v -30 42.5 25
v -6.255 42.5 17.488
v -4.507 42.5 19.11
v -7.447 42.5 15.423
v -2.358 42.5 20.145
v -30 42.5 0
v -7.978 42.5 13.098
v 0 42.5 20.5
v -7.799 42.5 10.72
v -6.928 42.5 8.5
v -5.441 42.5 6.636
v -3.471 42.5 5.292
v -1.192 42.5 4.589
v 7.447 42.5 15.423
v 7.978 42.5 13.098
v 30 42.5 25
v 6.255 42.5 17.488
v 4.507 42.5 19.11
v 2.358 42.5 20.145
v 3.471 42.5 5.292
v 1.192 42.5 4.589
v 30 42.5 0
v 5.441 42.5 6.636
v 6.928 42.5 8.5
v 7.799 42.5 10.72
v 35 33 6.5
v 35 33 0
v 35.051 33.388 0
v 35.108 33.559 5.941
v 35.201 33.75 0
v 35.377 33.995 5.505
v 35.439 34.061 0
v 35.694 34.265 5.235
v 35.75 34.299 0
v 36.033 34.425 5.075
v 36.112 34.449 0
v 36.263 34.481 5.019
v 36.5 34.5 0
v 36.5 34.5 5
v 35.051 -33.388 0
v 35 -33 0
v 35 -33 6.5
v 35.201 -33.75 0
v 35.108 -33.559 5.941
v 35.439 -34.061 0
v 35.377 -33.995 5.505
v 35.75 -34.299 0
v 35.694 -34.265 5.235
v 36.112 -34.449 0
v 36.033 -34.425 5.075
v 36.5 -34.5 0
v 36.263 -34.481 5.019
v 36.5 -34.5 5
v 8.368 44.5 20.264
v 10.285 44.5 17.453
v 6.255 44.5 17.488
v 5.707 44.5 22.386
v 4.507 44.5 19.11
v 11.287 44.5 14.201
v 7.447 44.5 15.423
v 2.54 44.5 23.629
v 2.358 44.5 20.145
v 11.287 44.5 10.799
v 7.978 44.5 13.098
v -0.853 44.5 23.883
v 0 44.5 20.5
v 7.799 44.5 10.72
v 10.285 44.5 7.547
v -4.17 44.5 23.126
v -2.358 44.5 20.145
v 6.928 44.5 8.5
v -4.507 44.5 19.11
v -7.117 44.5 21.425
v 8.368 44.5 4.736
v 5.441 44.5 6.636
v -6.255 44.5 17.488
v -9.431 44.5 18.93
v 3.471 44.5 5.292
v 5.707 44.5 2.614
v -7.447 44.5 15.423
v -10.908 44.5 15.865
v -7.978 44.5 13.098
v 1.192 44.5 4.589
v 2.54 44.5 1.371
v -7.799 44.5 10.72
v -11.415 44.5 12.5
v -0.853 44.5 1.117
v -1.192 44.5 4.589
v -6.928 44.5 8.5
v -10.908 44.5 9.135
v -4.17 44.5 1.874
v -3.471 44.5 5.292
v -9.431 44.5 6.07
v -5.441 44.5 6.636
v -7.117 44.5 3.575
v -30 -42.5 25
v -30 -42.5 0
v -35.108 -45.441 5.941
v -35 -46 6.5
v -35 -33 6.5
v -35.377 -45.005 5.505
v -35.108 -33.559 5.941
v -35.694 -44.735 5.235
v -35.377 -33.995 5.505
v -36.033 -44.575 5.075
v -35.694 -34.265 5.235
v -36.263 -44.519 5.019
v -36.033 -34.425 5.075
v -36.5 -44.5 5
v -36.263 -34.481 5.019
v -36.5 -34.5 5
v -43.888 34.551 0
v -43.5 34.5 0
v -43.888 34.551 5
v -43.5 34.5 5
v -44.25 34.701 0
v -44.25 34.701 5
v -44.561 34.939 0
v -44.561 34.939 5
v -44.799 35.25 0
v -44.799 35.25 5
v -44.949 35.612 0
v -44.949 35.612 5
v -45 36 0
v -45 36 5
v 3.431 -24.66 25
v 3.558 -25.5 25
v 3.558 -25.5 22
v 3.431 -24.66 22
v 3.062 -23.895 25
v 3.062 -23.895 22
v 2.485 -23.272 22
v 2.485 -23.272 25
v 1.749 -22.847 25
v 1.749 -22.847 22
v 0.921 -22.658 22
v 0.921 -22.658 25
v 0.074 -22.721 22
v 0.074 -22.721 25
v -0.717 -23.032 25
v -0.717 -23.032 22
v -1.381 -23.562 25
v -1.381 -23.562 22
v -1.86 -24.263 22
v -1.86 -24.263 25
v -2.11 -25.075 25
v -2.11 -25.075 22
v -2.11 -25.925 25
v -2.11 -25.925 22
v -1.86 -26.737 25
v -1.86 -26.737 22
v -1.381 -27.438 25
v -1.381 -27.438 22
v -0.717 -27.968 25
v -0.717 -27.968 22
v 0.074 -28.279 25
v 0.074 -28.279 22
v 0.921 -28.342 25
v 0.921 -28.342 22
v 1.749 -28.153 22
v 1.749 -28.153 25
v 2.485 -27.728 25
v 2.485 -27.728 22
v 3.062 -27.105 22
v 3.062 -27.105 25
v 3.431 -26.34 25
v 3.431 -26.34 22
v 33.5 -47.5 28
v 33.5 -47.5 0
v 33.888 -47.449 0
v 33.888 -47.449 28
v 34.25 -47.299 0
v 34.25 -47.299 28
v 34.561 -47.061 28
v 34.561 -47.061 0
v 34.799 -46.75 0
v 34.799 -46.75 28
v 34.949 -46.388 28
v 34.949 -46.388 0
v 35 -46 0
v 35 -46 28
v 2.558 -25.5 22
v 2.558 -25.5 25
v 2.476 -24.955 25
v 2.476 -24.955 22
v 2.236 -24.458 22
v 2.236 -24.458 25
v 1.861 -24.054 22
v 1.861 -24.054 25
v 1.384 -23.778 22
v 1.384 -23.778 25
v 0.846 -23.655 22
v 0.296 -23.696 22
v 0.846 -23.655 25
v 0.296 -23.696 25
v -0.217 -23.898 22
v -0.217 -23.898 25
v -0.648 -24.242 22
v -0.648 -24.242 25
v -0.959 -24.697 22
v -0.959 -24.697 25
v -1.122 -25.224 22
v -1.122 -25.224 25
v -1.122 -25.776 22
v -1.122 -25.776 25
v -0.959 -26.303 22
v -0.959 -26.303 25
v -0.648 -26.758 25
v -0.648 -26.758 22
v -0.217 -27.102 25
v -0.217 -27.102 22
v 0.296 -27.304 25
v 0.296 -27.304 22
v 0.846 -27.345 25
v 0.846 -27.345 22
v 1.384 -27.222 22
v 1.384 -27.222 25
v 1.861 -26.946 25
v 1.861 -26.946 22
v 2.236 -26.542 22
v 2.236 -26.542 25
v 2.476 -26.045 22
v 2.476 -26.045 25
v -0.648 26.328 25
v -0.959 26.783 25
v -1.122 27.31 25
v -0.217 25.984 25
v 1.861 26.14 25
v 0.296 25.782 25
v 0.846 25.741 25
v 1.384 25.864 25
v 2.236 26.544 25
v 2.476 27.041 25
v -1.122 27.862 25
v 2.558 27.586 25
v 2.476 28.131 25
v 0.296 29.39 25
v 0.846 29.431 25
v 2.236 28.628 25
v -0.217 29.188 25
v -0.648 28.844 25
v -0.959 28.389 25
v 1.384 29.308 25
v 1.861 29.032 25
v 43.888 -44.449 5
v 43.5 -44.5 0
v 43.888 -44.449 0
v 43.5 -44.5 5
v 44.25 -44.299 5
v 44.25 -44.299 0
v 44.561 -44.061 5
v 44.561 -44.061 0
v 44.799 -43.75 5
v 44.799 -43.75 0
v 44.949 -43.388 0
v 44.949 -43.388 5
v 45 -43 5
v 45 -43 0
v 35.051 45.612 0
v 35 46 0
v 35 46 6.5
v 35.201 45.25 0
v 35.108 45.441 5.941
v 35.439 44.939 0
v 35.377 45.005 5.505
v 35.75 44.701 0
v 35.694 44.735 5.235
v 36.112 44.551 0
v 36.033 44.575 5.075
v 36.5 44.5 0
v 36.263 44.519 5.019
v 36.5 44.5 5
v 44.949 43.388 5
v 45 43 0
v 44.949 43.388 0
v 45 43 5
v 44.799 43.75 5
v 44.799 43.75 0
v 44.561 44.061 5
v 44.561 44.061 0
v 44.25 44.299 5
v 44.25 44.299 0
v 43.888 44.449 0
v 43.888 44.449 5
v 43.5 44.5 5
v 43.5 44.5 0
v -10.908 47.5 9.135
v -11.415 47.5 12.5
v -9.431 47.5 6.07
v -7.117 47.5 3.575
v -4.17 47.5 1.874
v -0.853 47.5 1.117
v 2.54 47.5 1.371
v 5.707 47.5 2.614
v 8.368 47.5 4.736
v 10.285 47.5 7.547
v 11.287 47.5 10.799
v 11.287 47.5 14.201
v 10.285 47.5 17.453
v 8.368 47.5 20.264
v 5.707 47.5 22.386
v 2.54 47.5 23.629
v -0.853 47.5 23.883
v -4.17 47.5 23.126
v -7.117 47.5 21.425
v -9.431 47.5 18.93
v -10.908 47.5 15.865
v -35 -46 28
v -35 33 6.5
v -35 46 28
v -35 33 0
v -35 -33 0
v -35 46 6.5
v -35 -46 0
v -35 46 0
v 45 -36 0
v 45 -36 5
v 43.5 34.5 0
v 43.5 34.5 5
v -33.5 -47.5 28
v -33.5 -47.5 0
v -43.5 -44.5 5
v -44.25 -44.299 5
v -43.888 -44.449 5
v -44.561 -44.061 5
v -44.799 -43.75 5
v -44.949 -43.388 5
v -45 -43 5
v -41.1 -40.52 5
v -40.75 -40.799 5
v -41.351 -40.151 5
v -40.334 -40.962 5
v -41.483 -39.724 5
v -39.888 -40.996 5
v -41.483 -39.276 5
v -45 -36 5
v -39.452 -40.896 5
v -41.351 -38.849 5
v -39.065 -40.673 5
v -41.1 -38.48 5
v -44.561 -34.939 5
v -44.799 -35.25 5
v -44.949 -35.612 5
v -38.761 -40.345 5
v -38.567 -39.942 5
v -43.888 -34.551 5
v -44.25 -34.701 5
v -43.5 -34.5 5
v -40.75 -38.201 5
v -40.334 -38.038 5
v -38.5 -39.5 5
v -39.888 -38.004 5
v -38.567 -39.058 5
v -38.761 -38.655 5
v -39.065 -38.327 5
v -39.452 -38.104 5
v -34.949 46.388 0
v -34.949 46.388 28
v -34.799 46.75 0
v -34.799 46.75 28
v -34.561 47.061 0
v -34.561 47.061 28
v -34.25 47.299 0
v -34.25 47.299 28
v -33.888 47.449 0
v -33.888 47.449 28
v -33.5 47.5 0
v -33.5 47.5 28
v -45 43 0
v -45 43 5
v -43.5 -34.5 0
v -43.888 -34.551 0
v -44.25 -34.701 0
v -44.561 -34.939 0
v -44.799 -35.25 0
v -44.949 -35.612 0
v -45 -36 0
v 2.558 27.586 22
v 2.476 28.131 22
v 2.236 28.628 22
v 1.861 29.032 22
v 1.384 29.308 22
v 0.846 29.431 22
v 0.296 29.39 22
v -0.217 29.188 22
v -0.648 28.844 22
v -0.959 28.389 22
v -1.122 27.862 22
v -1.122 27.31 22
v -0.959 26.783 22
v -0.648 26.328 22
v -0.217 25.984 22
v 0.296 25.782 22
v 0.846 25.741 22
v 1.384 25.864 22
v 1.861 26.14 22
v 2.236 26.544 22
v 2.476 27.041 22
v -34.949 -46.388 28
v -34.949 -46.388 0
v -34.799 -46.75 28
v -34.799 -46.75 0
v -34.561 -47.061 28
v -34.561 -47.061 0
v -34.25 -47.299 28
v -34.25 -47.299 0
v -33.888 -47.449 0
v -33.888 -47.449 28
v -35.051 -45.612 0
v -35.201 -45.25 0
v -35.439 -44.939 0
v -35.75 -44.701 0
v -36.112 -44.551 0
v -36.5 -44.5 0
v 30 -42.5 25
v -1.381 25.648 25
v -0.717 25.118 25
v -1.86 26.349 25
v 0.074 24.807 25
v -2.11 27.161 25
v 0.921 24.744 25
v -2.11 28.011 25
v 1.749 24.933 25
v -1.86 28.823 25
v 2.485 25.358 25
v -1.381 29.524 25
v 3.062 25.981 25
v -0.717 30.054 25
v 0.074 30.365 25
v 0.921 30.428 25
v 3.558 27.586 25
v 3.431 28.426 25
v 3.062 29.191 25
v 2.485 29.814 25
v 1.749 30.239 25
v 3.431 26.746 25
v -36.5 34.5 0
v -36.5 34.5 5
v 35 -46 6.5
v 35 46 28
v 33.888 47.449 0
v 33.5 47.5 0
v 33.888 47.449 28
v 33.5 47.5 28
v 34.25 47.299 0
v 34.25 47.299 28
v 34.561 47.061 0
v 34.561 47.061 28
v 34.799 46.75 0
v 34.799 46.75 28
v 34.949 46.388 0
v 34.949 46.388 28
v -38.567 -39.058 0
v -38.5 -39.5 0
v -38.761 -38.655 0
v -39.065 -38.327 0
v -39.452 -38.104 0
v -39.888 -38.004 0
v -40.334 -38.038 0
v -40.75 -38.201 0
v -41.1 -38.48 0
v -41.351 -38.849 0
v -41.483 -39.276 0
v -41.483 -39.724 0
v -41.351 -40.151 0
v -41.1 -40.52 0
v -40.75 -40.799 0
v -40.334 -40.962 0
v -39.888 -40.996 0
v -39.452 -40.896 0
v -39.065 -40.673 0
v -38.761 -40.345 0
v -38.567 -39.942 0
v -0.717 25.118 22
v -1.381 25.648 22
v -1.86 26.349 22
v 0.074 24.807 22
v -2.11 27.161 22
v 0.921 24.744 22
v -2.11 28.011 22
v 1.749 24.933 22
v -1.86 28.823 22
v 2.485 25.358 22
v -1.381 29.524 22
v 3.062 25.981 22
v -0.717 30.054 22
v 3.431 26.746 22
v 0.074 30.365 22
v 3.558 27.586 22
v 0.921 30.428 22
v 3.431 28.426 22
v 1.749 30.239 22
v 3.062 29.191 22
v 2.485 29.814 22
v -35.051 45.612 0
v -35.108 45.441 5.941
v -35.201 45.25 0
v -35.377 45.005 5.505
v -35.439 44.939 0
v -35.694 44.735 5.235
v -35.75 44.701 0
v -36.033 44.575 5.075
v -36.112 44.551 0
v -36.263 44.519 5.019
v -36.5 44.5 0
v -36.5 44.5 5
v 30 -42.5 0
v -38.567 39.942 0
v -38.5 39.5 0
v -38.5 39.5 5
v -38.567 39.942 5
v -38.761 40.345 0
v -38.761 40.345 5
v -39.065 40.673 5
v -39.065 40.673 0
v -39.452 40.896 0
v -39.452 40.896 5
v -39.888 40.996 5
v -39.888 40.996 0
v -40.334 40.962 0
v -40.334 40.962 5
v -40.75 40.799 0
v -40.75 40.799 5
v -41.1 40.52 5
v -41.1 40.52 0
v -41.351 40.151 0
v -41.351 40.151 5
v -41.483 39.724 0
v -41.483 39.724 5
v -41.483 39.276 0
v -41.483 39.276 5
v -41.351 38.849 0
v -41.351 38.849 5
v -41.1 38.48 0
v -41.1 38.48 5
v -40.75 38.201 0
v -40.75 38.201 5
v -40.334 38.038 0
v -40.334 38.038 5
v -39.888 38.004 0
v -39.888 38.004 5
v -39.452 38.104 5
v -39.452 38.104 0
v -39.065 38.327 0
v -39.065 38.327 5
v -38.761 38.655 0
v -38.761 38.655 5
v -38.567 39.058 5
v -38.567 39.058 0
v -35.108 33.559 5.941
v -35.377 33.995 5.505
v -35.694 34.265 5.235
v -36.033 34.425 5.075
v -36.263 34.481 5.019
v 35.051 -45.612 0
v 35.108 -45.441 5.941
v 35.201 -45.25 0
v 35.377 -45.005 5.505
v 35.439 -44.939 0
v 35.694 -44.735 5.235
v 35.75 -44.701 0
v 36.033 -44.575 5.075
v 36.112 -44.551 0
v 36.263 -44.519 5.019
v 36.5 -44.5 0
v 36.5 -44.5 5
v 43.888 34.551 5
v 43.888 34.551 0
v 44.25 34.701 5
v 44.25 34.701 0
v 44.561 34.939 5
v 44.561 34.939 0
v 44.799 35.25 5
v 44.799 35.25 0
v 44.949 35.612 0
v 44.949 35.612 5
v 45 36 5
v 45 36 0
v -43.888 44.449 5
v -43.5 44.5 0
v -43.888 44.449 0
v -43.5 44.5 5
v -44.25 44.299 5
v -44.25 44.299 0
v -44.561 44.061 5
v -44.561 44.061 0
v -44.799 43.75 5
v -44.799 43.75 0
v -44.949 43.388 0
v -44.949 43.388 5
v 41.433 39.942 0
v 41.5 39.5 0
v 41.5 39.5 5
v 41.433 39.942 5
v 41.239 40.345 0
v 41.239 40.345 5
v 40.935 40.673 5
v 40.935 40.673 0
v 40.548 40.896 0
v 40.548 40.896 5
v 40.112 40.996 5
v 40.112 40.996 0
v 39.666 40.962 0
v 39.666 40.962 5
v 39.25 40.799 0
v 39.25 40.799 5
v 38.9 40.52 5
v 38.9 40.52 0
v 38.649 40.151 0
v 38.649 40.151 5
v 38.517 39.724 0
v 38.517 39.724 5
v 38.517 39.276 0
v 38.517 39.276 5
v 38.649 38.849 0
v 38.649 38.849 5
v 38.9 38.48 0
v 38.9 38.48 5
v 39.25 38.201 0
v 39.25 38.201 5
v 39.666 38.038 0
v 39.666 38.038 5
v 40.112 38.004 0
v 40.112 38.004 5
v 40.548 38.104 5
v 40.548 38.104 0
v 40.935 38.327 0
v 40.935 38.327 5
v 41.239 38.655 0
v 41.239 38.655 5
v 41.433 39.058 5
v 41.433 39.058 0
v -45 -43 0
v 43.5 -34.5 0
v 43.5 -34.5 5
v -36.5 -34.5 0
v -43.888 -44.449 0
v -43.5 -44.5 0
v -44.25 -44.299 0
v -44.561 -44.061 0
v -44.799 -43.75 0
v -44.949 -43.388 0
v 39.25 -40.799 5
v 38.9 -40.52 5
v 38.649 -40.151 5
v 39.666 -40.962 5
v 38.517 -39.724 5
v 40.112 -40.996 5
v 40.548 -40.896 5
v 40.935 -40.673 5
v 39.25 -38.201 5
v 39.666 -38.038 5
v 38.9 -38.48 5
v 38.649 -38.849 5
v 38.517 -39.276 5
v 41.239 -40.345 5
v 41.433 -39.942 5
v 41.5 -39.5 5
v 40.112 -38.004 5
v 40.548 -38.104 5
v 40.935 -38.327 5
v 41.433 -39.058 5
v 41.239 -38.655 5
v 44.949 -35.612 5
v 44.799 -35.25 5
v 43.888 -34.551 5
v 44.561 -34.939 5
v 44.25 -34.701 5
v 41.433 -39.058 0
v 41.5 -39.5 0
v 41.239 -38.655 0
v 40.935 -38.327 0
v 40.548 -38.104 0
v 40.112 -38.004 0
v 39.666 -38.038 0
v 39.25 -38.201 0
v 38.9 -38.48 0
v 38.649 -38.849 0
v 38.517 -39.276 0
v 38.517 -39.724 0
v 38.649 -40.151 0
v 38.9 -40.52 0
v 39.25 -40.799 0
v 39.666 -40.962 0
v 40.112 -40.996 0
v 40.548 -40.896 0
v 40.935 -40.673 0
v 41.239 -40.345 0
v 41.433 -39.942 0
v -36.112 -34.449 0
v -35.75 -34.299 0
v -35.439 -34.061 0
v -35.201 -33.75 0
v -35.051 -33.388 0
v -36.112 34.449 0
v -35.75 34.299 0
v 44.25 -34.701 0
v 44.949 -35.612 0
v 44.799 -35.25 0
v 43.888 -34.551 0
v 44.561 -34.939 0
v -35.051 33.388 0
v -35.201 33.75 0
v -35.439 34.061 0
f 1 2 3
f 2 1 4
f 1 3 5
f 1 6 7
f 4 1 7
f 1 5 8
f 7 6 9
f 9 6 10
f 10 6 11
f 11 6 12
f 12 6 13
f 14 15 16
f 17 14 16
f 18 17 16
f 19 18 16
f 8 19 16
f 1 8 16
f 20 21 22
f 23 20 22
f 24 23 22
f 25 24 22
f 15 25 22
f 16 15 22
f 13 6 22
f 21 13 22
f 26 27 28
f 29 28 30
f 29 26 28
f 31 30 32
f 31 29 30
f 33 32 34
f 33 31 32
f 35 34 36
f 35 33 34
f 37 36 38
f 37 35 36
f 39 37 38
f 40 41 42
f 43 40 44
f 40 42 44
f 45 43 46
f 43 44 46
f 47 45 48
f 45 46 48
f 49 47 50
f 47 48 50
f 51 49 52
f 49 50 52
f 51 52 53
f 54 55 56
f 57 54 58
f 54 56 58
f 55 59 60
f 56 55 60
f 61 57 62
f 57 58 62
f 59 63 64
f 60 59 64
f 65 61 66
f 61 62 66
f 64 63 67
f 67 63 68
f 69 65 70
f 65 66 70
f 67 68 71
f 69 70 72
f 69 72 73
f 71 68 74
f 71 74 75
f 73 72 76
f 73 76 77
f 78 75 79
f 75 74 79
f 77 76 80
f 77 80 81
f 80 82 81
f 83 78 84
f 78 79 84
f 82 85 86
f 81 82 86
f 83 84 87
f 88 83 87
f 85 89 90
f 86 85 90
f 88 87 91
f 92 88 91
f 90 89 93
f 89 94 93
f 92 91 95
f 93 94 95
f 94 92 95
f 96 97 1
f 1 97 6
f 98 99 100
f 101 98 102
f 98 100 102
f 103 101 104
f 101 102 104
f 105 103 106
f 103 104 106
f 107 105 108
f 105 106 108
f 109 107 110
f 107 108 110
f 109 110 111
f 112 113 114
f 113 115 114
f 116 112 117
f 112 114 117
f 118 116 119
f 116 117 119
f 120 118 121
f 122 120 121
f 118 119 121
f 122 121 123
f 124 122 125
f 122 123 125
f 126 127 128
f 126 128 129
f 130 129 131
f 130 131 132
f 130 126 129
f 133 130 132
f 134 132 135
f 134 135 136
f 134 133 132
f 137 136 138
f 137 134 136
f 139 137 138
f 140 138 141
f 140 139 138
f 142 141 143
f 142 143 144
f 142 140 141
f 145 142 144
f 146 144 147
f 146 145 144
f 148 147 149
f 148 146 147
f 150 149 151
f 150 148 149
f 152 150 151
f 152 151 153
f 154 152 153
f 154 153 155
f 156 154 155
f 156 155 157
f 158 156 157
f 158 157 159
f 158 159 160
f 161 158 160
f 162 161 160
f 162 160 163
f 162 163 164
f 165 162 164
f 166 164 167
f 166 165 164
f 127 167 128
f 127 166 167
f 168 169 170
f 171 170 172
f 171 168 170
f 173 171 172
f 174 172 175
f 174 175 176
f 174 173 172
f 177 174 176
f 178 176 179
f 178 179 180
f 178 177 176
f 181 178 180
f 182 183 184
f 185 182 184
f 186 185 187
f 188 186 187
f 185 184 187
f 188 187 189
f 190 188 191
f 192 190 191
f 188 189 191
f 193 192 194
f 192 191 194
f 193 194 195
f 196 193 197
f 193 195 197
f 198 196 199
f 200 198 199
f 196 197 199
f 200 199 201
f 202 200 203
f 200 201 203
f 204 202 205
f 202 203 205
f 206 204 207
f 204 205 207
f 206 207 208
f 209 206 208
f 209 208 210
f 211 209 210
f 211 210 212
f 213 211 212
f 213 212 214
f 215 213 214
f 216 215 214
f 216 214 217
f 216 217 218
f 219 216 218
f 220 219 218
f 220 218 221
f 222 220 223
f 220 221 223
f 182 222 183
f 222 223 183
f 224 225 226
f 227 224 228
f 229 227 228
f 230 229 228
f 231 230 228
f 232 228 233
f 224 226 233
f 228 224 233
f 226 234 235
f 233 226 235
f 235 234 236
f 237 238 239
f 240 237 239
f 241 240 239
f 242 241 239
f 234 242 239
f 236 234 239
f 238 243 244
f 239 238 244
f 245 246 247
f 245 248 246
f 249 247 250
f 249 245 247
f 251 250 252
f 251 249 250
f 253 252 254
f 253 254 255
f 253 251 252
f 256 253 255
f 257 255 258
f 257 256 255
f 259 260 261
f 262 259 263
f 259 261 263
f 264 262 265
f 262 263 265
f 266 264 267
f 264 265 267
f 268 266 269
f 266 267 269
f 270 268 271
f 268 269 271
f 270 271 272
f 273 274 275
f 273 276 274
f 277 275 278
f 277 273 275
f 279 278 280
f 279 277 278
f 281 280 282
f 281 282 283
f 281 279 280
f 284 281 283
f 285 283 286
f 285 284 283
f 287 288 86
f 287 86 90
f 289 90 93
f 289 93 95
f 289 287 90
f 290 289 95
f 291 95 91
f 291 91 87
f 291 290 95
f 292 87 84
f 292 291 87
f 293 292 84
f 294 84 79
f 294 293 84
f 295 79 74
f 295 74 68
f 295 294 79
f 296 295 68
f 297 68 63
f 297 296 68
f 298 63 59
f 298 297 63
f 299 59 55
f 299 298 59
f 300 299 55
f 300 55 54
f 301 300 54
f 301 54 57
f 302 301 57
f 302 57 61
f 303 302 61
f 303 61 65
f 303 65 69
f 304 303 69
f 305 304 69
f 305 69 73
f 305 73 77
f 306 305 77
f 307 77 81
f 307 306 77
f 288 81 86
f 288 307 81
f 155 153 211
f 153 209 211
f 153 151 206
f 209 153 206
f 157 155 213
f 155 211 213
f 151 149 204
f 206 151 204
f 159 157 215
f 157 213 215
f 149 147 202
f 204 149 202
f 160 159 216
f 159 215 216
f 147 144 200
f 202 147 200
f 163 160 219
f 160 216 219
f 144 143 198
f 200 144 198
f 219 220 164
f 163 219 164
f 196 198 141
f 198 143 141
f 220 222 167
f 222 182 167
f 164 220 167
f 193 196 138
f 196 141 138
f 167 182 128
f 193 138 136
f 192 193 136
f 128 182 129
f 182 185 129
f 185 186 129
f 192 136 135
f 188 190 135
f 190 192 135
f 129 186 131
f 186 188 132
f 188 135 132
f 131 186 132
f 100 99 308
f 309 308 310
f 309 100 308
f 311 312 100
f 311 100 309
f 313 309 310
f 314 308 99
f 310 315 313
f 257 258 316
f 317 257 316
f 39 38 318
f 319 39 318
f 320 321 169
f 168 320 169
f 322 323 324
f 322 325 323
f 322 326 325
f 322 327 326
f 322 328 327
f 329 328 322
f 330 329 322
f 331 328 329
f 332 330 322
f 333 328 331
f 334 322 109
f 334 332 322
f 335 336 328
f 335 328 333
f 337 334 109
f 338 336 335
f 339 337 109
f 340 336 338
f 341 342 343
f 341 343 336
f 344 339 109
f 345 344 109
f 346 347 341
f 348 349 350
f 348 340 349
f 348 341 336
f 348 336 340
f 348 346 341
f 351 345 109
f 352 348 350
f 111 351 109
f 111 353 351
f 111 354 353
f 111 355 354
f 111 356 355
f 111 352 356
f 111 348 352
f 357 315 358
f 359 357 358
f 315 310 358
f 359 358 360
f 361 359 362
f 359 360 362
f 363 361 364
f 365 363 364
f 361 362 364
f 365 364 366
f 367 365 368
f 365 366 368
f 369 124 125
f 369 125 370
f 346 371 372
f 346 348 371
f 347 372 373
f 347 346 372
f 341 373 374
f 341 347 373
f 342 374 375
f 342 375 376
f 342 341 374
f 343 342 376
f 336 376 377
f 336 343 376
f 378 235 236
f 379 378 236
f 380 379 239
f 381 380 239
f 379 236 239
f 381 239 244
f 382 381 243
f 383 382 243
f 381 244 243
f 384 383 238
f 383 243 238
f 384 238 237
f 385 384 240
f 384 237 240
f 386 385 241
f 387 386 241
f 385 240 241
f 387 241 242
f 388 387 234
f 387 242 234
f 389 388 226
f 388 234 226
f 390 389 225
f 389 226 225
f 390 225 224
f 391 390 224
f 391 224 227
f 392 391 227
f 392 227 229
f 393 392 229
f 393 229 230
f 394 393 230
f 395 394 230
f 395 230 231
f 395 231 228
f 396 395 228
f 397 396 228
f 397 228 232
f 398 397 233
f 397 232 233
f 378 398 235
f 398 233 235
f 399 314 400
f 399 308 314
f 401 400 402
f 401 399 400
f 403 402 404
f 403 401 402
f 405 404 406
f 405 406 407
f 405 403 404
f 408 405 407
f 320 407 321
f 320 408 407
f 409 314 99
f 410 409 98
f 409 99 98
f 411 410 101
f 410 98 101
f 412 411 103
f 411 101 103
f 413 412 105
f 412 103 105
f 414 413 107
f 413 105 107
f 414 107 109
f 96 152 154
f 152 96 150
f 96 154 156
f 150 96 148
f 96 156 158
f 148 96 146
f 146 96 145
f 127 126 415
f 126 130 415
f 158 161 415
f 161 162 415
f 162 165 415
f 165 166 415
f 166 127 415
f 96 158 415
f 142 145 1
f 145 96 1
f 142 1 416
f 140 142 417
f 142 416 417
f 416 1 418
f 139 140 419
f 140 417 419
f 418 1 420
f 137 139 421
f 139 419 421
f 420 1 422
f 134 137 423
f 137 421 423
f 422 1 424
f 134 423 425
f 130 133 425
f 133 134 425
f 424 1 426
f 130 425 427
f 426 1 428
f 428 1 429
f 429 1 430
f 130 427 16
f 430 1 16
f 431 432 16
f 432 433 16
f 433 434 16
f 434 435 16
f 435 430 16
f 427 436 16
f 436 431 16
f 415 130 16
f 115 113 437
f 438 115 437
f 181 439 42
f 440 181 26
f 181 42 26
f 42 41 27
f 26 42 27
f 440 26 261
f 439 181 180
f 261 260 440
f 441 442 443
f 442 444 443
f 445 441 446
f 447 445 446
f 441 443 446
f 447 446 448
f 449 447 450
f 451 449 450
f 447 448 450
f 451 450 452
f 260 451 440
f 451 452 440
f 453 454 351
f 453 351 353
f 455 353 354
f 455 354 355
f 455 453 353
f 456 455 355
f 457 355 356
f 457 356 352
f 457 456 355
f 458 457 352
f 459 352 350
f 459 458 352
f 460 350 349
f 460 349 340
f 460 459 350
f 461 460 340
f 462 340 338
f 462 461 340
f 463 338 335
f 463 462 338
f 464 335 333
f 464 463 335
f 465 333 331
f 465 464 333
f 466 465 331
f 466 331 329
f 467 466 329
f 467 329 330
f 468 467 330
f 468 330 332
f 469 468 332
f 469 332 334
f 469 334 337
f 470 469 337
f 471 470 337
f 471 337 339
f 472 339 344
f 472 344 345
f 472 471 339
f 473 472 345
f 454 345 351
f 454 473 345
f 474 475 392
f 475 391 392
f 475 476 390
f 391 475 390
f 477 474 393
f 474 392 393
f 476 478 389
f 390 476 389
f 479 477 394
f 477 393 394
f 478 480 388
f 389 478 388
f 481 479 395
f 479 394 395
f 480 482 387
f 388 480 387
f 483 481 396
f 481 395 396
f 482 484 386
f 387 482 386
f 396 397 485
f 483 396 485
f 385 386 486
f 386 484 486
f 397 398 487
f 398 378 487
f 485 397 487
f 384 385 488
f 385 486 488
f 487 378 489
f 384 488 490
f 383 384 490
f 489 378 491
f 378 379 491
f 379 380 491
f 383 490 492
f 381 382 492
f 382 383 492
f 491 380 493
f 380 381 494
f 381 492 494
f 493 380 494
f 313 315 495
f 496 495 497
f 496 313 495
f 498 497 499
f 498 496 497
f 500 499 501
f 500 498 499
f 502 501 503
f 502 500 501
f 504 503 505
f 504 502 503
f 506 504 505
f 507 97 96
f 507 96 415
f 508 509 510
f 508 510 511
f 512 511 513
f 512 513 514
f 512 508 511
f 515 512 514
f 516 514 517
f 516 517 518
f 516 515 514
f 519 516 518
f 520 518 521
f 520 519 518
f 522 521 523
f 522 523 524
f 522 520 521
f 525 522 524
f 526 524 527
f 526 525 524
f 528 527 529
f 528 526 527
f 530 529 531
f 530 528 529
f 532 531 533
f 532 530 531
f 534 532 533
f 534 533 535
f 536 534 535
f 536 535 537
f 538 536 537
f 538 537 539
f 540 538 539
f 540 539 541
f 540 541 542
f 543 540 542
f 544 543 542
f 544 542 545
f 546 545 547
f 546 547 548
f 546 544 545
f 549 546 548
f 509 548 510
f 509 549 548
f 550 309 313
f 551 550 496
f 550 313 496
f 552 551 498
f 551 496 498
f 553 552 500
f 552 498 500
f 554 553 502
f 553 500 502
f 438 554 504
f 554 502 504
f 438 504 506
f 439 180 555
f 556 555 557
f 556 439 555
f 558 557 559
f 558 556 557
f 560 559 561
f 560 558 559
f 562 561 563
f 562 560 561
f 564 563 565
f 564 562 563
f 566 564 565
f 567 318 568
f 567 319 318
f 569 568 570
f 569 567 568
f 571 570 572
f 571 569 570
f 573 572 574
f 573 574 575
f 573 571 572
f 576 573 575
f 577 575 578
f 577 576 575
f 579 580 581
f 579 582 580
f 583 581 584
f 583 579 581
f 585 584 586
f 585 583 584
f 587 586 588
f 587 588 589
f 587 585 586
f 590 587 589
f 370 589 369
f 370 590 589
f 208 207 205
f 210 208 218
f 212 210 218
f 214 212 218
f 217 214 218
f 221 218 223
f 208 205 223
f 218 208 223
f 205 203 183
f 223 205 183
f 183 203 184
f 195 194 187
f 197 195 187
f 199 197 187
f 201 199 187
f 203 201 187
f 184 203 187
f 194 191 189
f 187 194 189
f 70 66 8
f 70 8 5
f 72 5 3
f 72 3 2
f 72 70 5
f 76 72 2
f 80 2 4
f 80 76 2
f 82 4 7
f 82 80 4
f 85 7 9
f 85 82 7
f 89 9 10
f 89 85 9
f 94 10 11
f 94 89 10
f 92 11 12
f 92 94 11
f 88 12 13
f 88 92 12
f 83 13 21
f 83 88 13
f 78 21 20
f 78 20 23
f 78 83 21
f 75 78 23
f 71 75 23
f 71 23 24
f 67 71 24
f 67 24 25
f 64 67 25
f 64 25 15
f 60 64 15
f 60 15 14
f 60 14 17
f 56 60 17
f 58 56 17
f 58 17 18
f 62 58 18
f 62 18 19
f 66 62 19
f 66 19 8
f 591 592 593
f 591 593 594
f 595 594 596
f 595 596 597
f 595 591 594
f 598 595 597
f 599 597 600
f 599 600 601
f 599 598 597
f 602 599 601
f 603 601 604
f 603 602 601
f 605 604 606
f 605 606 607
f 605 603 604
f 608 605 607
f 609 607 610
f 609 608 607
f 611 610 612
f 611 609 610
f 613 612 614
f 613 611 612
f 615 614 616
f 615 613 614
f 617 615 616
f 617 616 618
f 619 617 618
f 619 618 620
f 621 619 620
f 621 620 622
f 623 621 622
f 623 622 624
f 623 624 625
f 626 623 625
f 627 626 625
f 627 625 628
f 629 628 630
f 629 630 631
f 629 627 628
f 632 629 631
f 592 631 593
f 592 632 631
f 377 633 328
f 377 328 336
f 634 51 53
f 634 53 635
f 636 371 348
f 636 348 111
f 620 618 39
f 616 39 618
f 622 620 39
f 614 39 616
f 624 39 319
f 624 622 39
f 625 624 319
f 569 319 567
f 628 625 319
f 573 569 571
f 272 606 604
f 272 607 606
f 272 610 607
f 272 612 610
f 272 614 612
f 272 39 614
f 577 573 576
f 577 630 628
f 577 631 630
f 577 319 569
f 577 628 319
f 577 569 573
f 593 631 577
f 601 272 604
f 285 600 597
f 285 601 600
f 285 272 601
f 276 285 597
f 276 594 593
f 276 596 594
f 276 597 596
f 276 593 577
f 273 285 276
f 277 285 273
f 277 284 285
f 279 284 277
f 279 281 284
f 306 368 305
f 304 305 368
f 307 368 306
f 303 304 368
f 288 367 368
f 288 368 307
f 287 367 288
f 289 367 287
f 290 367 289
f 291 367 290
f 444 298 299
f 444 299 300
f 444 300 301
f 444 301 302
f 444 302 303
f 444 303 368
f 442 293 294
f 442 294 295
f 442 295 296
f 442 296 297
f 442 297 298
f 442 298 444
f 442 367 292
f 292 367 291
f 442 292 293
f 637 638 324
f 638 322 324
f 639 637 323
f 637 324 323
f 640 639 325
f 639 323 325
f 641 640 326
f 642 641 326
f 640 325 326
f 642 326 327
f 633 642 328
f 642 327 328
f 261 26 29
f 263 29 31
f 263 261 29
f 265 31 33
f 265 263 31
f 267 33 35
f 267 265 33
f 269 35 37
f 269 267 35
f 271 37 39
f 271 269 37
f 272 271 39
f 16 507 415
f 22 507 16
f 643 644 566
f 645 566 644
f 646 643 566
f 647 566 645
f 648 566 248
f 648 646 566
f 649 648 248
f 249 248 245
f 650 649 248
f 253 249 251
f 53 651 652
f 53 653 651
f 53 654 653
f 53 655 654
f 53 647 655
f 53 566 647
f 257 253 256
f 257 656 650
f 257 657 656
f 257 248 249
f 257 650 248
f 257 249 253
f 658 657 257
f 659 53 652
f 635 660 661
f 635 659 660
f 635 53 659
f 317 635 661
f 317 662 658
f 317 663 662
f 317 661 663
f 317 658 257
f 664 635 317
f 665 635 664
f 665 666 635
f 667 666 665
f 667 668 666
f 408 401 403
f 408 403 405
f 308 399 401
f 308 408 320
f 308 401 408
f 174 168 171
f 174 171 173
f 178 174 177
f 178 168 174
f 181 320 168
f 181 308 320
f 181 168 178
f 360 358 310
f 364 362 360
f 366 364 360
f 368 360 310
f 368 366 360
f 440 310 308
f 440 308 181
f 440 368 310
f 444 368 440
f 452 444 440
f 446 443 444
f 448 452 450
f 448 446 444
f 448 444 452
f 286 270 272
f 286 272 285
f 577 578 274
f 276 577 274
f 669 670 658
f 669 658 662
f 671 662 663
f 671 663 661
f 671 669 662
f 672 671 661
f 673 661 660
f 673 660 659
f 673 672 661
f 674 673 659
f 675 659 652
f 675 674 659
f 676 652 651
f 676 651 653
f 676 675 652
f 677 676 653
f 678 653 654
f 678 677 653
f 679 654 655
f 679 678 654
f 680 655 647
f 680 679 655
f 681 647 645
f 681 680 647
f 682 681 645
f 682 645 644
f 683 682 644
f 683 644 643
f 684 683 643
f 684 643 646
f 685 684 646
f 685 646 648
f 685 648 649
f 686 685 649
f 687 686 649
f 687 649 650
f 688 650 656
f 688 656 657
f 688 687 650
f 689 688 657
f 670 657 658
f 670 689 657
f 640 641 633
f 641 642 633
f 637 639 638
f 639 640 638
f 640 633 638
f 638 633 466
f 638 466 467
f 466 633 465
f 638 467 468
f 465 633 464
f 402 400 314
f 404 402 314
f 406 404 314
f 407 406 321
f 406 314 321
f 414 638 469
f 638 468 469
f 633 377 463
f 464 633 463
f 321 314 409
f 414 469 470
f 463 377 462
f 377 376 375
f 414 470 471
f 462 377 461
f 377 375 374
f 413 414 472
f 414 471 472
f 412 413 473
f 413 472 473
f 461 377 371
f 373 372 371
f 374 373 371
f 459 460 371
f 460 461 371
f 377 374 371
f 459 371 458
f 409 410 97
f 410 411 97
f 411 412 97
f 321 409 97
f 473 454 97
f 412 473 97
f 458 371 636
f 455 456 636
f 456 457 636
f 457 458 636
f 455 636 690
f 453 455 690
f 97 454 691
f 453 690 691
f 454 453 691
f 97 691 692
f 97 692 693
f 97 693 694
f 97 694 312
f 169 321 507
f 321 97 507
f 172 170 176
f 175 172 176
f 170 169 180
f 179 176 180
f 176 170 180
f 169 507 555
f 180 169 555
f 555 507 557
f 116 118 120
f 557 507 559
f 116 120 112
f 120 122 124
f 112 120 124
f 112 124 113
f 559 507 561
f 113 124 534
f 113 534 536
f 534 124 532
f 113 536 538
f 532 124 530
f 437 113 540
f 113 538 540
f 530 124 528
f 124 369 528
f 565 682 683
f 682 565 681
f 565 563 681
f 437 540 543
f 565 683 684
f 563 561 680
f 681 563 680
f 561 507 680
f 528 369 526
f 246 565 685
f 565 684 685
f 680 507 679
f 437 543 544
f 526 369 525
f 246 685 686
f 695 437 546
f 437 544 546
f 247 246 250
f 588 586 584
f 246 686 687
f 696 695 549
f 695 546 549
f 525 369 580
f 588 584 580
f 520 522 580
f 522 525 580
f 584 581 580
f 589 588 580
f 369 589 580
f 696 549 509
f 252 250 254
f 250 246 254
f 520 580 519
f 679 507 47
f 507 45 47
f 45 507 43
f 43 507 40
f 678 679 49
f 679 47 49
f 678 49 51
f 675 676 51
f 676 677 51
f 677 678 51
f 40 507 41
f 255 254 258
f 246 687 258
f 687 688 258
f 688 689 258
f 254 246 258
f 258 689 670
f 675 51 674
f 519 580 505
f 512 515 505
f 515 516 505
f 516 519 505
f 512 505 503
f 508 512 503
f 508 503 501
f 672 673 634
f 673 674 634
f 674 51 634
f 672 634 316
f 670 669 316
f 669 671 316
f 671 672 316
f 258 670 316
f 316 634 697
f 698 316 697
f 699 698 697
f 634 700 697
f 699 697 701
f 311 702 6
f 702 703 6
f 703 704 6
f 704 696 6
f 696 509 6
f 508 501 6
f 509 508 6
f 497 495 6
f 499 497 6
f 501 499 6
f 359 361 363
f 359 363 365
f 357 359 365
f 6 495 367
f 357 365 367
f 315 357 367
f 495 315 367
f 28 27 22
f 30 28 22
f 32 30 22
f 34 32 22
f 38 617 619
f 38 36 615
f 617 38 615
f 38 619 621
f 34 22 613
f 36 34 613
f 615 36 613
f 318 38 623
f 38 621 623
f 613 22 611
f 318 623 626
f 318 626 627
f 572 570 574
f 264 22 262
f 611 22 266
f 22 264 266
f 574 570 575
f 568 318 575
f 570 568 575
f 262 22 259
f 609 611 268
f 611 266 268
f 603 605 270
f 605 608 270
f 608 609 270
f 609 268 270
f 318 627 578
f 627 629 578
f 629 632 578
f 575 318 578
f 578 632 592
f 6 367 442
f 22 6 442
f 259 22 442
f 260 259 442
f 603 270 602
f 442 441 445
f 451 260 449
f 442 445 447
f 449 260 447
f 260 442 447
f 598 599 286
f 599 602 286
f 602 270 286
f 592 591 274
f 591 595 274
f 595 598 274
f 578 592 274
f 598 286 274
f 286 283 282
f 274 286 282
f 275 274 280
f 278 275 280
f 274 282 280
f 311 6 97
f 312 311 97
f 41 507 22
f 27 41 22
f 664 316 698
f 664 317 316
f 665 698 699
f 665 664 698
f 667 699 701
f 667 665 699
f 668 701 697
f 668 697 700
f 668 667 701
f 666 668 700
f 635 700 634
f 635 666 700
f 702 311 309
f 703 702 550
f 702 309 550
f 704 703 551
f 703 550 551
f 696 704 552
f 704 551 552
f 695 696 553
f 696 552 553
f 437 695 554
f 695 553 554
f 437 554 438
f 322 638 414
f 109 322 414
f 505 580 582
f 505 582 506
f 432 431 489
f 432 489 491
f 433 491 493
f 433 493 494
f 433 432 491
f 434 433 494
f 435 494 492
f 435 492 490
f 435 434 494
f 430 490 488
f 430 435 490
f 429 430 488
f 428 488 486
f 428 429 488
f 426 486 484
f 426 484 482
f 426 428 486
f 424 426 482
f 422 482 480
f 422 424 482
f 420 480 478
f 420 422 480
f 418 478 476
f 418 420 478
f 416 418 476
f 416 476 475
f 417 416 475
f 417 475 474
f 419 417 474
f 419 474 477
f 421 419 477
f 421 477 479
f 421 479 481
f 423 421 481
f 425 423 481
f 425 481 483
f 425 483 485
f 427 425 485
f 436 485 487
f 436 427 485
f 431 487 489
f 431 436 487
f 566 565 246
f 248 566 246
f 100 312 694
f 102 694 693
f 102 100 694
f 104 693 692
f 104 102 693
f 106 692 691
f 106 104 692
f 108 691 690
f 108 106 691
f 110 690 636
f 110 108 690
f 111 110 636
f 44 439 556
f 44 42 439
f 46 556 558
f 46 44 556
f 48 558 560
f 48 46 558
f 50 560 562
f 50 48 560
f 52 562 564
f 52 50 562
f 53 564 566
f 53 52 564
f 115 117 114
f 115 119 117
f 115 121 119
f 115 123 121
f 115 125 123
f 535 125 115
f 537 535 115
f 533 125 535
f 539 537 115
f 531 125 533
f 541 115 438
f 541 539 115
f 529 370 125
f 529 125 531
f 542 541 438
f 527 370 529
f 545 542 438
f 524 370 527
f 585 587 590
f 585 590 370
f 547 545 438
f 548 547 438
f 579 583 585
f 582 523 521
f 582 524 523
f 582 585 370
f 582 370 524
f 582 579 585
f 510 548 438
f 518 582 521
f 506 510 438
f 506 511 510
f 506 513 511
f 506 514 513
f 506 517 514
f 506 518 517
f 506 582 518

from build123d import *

# Parameters (mm, degrees)
SKETCH1_W            = 70
SKETCH1_H            = 95
BASE_DEPTH           = 28
SKETCH1_7_W          = 10
SKETCH1_7_H          = 10
SKETCH1_7_R          = 1.5
MOUNTING_HOLES_DEPTH = 5
SKETCH1_6_W          = 60
SKETCH1_6_H          = 85
SKETCH1_6_R          = 2.85
SKETCH1_6_R_2        = 1.85
CAVITY_DEPTH         = 25
STANDOFF_START       = 25
SKETCH1_9_R          = 2.85
SKETCH1_9_R_2        = 1.85
STANDOFF_DEPTH       = 3
PG9_DEPTH            = 5
SKETCH3_3_R          = 11.414954575
SKETCH3_3_R_2        = 8
CUT_EXTRUDE4_DEPTH   = 3
EXTERNAL_FILLET_R    = 1.5


with BuildPart() as part:
    # Sketch1 → Base (new body)
    with BuildSketch(Plane.XY):
        Rectangle(SKETCH1_W, SKETCH1_H)
    extrude(amount=BASE_DEPTH)

    # Sketch1<7> → Mounting Holes (add)
    # profile 1 of 4: a face of its own
    with BuildSketch(Plane.XY):
        with Locations((40, 39.5)):
            Rectangle(SKETCH1_7_W, SKETCH1_7_H)
        with Locations((40, 39.5)):
            Circle(SKETCH1_7_R, mode=Mode.SUBTRACT)
    # profile 2 of 4: a face of its own
    with BuildSketch(Plane.XY):
        with Locations((40, -39.5)):
            Rectangle(SKETCH1_7_W, SKETCH1_7_H)
        with Locations((40, -39.5)):
            Circle(SKETCH1_7_R, mode=Mode.SUBTRACT)
    # profile 3 of 4: a face of its own
    with BuildSketch(Plane.XY):
        with Locations((-40, -39.5)):
            Rectangle(SKETCH1_7_W, SKETCH1_7_H)
        with Locations((-40, -39.5)):
            Circle(SKETCH1_7_R, mode=Mode.SUBTRACT)
    # profile 4 of 4: a face of its own
    with BuildSketch(Plane.XY):
        with Locations((-40, 39.5)):
            Rectangle(SKETCH1_7_W, SKETCH1_7_H)
        with Locations((-40, 39.5)):
            Circle(SKETCH1_7_R, mode=Mode.SUBTRACT)
    extrude(amount=MOUNTING_HOLES_DEPTH)

    # Sketch1<6> → Cavity (cut)
    # profile 1 of 5: a face of its own
    with BuildSketch(Plane.XY):
        Rectangle(SKETCH1_6_W, SKETCH1_6_H)
        with Locations((0.70771822, -25.5)):
            Circle(SKETCH1_6_R, mode=Mode.SUBTRACT)
        with Locations((0.70771822, 27.586)):
            Circle(SKETCH1_6_R, mode=Mode.SUBTRACT)
    # profile 2 of 5: a face of its own
    with BuildSketch(Plane.XY):
        with Locations((0.70771822, 27.586)):
            Circle(SKETCH1_6_R)
        with Locations((0.70771822, 27.586)):
            Circle(SKETCH1_6_R_2, mode=Mode.SUBTRACT)
    # profile 3 of 5: a face of its own
    with BuildSketch(Plane.XY):
        with Locations((0.70771822, 27.586)):
            Circle(SKETCH1_6_R_2)
    # profile 4 of 5: a face of its own
    with BuildSketch(Plane.XY):
        with Locations((0.70771822, -25.5)):
            Circle(SKETCH1_6_R)
        with Locations((0.70771822, -25.5)):
            Circle(SKETCH1_6_R_2, mode=Mode.SUBTRACT)
    # profile 5 of 5: a face of its own
    with BuildSketch(Plane.XY):
        with Locations((0.70771822, -25.5)):
            Circle(SKETCH1_6_R_2)
    extrude(amount=CAVITY_DEPTH, mode=Mode.SUBTRACT)

    # Sketch1<9> → Standoff (add)
    # profile 1 of 2: a face of its own
    with BuildSketch(Plane.XY.offset(STANDOFF_START)):
        with Locations((0.70771822, 27.586)):
            Circle(SKETCH1_9_R)
        with Locations((0.70771822, 27.586)):
            Circle(SKETCH1_9_R_2, mode=Mode.SUBTRACT)
    # profile 2 of 2: a face of its own
    with BuildSketch(Plane.XY.offset(STANDOFF_START)):
        with Locations((0.70771822, -25.5)):
            Circle(SKETCH1_9_R)
        with Locations((0.70771822, -25.5)):
            Circle(SKETCH1_9_R_2, mode=Mode.SUBTRACT)
    extrude(amount=-STANDOFF_DEPTH)

    # Sketch3 → PG9 (cut)
    with BuildSketch(Plane(origin=(7.707718219, 47.5, 0), x_dir=(0, 0, 1), z_dir=(0, -1, 0))):
        with BuildLine():
            ThreePointArc((4.5, 7.707718219), (12.5, -0.292281781), (20.5, 7.707718219))
            Line((20.5, 7.707718219), (4.5, 7.707718219))
        make_face()
        with BuildLine():
            Line((4.5, 7.707718219), (20.5, 7.707718219))
            ThreePointArc((20.5, 7.707718219), (12.5, 15.707718219), (4.5, 7.707718219))
        make_face()
    extrude(amount=PG9_DEPTH, mode=Mode.SUBTRACT)

    # Sketch3<3> → Cut-Extrude4 (cut)
    with BuildSketch(Plane(origin=(7.707718219, 47.5, 0), x_dir=(0, 0, 1), z_dir=(0, -1, 0))):
        with Locations(Location((12.5, 7.707718219, 0), (0, 0, 90))):
            Circle(SKETCH3_3_R)
        with Locations((12.5, 7.707718219)):
            Circle(SKETCH3_3_R_2, mode=Mode.SUBTRACT)
    extrude(amount=CUT_EXTRUDE4_DEPTH, mode=Mode.SUBTRACT)

    # External Fillet
    external_fillet_edges = [part.edges().sort_by_distance(p)[0] for p in [
        (45, 34.5, 2.5),
        (45, 44.5, 2.5),
        (35, 39.5, 5),
        (35, 44.5, 2.5),
        (35, 34.5, 2.5),
        (45, -34.5, 2.5),
        (35, -39.5, 5),
        (35, -34.5, 2.5),
        (35, -44.5, 2.5),
        (45, -44.5, 2.5),
        (-45, -34.5, 2.5),
        (-45, -44.5, 2.5),
        (-35, -44.5, 2.5),
        (-35, -34.5, 2.5),
        (-35, -39.5, 5),
        (-35, 34.5, 2.5),
        (-35, 44.5, 2.5),
        (-45, 44.5, 2.5),
        (-45, 34.5, 2.5),
        (-35, 39.5, 5),
        (-35, -47.5, 14),
        (-35, 47.5, 14),
        (35, 47.5, 14),
        (35, -47.5, 14),
    ]]
    fillet(external_fillet_edges, radius=EXTERNAL_FILLET_R - 0.0001)  # a hair under: the kernel refuses the full size


solid = part.part
